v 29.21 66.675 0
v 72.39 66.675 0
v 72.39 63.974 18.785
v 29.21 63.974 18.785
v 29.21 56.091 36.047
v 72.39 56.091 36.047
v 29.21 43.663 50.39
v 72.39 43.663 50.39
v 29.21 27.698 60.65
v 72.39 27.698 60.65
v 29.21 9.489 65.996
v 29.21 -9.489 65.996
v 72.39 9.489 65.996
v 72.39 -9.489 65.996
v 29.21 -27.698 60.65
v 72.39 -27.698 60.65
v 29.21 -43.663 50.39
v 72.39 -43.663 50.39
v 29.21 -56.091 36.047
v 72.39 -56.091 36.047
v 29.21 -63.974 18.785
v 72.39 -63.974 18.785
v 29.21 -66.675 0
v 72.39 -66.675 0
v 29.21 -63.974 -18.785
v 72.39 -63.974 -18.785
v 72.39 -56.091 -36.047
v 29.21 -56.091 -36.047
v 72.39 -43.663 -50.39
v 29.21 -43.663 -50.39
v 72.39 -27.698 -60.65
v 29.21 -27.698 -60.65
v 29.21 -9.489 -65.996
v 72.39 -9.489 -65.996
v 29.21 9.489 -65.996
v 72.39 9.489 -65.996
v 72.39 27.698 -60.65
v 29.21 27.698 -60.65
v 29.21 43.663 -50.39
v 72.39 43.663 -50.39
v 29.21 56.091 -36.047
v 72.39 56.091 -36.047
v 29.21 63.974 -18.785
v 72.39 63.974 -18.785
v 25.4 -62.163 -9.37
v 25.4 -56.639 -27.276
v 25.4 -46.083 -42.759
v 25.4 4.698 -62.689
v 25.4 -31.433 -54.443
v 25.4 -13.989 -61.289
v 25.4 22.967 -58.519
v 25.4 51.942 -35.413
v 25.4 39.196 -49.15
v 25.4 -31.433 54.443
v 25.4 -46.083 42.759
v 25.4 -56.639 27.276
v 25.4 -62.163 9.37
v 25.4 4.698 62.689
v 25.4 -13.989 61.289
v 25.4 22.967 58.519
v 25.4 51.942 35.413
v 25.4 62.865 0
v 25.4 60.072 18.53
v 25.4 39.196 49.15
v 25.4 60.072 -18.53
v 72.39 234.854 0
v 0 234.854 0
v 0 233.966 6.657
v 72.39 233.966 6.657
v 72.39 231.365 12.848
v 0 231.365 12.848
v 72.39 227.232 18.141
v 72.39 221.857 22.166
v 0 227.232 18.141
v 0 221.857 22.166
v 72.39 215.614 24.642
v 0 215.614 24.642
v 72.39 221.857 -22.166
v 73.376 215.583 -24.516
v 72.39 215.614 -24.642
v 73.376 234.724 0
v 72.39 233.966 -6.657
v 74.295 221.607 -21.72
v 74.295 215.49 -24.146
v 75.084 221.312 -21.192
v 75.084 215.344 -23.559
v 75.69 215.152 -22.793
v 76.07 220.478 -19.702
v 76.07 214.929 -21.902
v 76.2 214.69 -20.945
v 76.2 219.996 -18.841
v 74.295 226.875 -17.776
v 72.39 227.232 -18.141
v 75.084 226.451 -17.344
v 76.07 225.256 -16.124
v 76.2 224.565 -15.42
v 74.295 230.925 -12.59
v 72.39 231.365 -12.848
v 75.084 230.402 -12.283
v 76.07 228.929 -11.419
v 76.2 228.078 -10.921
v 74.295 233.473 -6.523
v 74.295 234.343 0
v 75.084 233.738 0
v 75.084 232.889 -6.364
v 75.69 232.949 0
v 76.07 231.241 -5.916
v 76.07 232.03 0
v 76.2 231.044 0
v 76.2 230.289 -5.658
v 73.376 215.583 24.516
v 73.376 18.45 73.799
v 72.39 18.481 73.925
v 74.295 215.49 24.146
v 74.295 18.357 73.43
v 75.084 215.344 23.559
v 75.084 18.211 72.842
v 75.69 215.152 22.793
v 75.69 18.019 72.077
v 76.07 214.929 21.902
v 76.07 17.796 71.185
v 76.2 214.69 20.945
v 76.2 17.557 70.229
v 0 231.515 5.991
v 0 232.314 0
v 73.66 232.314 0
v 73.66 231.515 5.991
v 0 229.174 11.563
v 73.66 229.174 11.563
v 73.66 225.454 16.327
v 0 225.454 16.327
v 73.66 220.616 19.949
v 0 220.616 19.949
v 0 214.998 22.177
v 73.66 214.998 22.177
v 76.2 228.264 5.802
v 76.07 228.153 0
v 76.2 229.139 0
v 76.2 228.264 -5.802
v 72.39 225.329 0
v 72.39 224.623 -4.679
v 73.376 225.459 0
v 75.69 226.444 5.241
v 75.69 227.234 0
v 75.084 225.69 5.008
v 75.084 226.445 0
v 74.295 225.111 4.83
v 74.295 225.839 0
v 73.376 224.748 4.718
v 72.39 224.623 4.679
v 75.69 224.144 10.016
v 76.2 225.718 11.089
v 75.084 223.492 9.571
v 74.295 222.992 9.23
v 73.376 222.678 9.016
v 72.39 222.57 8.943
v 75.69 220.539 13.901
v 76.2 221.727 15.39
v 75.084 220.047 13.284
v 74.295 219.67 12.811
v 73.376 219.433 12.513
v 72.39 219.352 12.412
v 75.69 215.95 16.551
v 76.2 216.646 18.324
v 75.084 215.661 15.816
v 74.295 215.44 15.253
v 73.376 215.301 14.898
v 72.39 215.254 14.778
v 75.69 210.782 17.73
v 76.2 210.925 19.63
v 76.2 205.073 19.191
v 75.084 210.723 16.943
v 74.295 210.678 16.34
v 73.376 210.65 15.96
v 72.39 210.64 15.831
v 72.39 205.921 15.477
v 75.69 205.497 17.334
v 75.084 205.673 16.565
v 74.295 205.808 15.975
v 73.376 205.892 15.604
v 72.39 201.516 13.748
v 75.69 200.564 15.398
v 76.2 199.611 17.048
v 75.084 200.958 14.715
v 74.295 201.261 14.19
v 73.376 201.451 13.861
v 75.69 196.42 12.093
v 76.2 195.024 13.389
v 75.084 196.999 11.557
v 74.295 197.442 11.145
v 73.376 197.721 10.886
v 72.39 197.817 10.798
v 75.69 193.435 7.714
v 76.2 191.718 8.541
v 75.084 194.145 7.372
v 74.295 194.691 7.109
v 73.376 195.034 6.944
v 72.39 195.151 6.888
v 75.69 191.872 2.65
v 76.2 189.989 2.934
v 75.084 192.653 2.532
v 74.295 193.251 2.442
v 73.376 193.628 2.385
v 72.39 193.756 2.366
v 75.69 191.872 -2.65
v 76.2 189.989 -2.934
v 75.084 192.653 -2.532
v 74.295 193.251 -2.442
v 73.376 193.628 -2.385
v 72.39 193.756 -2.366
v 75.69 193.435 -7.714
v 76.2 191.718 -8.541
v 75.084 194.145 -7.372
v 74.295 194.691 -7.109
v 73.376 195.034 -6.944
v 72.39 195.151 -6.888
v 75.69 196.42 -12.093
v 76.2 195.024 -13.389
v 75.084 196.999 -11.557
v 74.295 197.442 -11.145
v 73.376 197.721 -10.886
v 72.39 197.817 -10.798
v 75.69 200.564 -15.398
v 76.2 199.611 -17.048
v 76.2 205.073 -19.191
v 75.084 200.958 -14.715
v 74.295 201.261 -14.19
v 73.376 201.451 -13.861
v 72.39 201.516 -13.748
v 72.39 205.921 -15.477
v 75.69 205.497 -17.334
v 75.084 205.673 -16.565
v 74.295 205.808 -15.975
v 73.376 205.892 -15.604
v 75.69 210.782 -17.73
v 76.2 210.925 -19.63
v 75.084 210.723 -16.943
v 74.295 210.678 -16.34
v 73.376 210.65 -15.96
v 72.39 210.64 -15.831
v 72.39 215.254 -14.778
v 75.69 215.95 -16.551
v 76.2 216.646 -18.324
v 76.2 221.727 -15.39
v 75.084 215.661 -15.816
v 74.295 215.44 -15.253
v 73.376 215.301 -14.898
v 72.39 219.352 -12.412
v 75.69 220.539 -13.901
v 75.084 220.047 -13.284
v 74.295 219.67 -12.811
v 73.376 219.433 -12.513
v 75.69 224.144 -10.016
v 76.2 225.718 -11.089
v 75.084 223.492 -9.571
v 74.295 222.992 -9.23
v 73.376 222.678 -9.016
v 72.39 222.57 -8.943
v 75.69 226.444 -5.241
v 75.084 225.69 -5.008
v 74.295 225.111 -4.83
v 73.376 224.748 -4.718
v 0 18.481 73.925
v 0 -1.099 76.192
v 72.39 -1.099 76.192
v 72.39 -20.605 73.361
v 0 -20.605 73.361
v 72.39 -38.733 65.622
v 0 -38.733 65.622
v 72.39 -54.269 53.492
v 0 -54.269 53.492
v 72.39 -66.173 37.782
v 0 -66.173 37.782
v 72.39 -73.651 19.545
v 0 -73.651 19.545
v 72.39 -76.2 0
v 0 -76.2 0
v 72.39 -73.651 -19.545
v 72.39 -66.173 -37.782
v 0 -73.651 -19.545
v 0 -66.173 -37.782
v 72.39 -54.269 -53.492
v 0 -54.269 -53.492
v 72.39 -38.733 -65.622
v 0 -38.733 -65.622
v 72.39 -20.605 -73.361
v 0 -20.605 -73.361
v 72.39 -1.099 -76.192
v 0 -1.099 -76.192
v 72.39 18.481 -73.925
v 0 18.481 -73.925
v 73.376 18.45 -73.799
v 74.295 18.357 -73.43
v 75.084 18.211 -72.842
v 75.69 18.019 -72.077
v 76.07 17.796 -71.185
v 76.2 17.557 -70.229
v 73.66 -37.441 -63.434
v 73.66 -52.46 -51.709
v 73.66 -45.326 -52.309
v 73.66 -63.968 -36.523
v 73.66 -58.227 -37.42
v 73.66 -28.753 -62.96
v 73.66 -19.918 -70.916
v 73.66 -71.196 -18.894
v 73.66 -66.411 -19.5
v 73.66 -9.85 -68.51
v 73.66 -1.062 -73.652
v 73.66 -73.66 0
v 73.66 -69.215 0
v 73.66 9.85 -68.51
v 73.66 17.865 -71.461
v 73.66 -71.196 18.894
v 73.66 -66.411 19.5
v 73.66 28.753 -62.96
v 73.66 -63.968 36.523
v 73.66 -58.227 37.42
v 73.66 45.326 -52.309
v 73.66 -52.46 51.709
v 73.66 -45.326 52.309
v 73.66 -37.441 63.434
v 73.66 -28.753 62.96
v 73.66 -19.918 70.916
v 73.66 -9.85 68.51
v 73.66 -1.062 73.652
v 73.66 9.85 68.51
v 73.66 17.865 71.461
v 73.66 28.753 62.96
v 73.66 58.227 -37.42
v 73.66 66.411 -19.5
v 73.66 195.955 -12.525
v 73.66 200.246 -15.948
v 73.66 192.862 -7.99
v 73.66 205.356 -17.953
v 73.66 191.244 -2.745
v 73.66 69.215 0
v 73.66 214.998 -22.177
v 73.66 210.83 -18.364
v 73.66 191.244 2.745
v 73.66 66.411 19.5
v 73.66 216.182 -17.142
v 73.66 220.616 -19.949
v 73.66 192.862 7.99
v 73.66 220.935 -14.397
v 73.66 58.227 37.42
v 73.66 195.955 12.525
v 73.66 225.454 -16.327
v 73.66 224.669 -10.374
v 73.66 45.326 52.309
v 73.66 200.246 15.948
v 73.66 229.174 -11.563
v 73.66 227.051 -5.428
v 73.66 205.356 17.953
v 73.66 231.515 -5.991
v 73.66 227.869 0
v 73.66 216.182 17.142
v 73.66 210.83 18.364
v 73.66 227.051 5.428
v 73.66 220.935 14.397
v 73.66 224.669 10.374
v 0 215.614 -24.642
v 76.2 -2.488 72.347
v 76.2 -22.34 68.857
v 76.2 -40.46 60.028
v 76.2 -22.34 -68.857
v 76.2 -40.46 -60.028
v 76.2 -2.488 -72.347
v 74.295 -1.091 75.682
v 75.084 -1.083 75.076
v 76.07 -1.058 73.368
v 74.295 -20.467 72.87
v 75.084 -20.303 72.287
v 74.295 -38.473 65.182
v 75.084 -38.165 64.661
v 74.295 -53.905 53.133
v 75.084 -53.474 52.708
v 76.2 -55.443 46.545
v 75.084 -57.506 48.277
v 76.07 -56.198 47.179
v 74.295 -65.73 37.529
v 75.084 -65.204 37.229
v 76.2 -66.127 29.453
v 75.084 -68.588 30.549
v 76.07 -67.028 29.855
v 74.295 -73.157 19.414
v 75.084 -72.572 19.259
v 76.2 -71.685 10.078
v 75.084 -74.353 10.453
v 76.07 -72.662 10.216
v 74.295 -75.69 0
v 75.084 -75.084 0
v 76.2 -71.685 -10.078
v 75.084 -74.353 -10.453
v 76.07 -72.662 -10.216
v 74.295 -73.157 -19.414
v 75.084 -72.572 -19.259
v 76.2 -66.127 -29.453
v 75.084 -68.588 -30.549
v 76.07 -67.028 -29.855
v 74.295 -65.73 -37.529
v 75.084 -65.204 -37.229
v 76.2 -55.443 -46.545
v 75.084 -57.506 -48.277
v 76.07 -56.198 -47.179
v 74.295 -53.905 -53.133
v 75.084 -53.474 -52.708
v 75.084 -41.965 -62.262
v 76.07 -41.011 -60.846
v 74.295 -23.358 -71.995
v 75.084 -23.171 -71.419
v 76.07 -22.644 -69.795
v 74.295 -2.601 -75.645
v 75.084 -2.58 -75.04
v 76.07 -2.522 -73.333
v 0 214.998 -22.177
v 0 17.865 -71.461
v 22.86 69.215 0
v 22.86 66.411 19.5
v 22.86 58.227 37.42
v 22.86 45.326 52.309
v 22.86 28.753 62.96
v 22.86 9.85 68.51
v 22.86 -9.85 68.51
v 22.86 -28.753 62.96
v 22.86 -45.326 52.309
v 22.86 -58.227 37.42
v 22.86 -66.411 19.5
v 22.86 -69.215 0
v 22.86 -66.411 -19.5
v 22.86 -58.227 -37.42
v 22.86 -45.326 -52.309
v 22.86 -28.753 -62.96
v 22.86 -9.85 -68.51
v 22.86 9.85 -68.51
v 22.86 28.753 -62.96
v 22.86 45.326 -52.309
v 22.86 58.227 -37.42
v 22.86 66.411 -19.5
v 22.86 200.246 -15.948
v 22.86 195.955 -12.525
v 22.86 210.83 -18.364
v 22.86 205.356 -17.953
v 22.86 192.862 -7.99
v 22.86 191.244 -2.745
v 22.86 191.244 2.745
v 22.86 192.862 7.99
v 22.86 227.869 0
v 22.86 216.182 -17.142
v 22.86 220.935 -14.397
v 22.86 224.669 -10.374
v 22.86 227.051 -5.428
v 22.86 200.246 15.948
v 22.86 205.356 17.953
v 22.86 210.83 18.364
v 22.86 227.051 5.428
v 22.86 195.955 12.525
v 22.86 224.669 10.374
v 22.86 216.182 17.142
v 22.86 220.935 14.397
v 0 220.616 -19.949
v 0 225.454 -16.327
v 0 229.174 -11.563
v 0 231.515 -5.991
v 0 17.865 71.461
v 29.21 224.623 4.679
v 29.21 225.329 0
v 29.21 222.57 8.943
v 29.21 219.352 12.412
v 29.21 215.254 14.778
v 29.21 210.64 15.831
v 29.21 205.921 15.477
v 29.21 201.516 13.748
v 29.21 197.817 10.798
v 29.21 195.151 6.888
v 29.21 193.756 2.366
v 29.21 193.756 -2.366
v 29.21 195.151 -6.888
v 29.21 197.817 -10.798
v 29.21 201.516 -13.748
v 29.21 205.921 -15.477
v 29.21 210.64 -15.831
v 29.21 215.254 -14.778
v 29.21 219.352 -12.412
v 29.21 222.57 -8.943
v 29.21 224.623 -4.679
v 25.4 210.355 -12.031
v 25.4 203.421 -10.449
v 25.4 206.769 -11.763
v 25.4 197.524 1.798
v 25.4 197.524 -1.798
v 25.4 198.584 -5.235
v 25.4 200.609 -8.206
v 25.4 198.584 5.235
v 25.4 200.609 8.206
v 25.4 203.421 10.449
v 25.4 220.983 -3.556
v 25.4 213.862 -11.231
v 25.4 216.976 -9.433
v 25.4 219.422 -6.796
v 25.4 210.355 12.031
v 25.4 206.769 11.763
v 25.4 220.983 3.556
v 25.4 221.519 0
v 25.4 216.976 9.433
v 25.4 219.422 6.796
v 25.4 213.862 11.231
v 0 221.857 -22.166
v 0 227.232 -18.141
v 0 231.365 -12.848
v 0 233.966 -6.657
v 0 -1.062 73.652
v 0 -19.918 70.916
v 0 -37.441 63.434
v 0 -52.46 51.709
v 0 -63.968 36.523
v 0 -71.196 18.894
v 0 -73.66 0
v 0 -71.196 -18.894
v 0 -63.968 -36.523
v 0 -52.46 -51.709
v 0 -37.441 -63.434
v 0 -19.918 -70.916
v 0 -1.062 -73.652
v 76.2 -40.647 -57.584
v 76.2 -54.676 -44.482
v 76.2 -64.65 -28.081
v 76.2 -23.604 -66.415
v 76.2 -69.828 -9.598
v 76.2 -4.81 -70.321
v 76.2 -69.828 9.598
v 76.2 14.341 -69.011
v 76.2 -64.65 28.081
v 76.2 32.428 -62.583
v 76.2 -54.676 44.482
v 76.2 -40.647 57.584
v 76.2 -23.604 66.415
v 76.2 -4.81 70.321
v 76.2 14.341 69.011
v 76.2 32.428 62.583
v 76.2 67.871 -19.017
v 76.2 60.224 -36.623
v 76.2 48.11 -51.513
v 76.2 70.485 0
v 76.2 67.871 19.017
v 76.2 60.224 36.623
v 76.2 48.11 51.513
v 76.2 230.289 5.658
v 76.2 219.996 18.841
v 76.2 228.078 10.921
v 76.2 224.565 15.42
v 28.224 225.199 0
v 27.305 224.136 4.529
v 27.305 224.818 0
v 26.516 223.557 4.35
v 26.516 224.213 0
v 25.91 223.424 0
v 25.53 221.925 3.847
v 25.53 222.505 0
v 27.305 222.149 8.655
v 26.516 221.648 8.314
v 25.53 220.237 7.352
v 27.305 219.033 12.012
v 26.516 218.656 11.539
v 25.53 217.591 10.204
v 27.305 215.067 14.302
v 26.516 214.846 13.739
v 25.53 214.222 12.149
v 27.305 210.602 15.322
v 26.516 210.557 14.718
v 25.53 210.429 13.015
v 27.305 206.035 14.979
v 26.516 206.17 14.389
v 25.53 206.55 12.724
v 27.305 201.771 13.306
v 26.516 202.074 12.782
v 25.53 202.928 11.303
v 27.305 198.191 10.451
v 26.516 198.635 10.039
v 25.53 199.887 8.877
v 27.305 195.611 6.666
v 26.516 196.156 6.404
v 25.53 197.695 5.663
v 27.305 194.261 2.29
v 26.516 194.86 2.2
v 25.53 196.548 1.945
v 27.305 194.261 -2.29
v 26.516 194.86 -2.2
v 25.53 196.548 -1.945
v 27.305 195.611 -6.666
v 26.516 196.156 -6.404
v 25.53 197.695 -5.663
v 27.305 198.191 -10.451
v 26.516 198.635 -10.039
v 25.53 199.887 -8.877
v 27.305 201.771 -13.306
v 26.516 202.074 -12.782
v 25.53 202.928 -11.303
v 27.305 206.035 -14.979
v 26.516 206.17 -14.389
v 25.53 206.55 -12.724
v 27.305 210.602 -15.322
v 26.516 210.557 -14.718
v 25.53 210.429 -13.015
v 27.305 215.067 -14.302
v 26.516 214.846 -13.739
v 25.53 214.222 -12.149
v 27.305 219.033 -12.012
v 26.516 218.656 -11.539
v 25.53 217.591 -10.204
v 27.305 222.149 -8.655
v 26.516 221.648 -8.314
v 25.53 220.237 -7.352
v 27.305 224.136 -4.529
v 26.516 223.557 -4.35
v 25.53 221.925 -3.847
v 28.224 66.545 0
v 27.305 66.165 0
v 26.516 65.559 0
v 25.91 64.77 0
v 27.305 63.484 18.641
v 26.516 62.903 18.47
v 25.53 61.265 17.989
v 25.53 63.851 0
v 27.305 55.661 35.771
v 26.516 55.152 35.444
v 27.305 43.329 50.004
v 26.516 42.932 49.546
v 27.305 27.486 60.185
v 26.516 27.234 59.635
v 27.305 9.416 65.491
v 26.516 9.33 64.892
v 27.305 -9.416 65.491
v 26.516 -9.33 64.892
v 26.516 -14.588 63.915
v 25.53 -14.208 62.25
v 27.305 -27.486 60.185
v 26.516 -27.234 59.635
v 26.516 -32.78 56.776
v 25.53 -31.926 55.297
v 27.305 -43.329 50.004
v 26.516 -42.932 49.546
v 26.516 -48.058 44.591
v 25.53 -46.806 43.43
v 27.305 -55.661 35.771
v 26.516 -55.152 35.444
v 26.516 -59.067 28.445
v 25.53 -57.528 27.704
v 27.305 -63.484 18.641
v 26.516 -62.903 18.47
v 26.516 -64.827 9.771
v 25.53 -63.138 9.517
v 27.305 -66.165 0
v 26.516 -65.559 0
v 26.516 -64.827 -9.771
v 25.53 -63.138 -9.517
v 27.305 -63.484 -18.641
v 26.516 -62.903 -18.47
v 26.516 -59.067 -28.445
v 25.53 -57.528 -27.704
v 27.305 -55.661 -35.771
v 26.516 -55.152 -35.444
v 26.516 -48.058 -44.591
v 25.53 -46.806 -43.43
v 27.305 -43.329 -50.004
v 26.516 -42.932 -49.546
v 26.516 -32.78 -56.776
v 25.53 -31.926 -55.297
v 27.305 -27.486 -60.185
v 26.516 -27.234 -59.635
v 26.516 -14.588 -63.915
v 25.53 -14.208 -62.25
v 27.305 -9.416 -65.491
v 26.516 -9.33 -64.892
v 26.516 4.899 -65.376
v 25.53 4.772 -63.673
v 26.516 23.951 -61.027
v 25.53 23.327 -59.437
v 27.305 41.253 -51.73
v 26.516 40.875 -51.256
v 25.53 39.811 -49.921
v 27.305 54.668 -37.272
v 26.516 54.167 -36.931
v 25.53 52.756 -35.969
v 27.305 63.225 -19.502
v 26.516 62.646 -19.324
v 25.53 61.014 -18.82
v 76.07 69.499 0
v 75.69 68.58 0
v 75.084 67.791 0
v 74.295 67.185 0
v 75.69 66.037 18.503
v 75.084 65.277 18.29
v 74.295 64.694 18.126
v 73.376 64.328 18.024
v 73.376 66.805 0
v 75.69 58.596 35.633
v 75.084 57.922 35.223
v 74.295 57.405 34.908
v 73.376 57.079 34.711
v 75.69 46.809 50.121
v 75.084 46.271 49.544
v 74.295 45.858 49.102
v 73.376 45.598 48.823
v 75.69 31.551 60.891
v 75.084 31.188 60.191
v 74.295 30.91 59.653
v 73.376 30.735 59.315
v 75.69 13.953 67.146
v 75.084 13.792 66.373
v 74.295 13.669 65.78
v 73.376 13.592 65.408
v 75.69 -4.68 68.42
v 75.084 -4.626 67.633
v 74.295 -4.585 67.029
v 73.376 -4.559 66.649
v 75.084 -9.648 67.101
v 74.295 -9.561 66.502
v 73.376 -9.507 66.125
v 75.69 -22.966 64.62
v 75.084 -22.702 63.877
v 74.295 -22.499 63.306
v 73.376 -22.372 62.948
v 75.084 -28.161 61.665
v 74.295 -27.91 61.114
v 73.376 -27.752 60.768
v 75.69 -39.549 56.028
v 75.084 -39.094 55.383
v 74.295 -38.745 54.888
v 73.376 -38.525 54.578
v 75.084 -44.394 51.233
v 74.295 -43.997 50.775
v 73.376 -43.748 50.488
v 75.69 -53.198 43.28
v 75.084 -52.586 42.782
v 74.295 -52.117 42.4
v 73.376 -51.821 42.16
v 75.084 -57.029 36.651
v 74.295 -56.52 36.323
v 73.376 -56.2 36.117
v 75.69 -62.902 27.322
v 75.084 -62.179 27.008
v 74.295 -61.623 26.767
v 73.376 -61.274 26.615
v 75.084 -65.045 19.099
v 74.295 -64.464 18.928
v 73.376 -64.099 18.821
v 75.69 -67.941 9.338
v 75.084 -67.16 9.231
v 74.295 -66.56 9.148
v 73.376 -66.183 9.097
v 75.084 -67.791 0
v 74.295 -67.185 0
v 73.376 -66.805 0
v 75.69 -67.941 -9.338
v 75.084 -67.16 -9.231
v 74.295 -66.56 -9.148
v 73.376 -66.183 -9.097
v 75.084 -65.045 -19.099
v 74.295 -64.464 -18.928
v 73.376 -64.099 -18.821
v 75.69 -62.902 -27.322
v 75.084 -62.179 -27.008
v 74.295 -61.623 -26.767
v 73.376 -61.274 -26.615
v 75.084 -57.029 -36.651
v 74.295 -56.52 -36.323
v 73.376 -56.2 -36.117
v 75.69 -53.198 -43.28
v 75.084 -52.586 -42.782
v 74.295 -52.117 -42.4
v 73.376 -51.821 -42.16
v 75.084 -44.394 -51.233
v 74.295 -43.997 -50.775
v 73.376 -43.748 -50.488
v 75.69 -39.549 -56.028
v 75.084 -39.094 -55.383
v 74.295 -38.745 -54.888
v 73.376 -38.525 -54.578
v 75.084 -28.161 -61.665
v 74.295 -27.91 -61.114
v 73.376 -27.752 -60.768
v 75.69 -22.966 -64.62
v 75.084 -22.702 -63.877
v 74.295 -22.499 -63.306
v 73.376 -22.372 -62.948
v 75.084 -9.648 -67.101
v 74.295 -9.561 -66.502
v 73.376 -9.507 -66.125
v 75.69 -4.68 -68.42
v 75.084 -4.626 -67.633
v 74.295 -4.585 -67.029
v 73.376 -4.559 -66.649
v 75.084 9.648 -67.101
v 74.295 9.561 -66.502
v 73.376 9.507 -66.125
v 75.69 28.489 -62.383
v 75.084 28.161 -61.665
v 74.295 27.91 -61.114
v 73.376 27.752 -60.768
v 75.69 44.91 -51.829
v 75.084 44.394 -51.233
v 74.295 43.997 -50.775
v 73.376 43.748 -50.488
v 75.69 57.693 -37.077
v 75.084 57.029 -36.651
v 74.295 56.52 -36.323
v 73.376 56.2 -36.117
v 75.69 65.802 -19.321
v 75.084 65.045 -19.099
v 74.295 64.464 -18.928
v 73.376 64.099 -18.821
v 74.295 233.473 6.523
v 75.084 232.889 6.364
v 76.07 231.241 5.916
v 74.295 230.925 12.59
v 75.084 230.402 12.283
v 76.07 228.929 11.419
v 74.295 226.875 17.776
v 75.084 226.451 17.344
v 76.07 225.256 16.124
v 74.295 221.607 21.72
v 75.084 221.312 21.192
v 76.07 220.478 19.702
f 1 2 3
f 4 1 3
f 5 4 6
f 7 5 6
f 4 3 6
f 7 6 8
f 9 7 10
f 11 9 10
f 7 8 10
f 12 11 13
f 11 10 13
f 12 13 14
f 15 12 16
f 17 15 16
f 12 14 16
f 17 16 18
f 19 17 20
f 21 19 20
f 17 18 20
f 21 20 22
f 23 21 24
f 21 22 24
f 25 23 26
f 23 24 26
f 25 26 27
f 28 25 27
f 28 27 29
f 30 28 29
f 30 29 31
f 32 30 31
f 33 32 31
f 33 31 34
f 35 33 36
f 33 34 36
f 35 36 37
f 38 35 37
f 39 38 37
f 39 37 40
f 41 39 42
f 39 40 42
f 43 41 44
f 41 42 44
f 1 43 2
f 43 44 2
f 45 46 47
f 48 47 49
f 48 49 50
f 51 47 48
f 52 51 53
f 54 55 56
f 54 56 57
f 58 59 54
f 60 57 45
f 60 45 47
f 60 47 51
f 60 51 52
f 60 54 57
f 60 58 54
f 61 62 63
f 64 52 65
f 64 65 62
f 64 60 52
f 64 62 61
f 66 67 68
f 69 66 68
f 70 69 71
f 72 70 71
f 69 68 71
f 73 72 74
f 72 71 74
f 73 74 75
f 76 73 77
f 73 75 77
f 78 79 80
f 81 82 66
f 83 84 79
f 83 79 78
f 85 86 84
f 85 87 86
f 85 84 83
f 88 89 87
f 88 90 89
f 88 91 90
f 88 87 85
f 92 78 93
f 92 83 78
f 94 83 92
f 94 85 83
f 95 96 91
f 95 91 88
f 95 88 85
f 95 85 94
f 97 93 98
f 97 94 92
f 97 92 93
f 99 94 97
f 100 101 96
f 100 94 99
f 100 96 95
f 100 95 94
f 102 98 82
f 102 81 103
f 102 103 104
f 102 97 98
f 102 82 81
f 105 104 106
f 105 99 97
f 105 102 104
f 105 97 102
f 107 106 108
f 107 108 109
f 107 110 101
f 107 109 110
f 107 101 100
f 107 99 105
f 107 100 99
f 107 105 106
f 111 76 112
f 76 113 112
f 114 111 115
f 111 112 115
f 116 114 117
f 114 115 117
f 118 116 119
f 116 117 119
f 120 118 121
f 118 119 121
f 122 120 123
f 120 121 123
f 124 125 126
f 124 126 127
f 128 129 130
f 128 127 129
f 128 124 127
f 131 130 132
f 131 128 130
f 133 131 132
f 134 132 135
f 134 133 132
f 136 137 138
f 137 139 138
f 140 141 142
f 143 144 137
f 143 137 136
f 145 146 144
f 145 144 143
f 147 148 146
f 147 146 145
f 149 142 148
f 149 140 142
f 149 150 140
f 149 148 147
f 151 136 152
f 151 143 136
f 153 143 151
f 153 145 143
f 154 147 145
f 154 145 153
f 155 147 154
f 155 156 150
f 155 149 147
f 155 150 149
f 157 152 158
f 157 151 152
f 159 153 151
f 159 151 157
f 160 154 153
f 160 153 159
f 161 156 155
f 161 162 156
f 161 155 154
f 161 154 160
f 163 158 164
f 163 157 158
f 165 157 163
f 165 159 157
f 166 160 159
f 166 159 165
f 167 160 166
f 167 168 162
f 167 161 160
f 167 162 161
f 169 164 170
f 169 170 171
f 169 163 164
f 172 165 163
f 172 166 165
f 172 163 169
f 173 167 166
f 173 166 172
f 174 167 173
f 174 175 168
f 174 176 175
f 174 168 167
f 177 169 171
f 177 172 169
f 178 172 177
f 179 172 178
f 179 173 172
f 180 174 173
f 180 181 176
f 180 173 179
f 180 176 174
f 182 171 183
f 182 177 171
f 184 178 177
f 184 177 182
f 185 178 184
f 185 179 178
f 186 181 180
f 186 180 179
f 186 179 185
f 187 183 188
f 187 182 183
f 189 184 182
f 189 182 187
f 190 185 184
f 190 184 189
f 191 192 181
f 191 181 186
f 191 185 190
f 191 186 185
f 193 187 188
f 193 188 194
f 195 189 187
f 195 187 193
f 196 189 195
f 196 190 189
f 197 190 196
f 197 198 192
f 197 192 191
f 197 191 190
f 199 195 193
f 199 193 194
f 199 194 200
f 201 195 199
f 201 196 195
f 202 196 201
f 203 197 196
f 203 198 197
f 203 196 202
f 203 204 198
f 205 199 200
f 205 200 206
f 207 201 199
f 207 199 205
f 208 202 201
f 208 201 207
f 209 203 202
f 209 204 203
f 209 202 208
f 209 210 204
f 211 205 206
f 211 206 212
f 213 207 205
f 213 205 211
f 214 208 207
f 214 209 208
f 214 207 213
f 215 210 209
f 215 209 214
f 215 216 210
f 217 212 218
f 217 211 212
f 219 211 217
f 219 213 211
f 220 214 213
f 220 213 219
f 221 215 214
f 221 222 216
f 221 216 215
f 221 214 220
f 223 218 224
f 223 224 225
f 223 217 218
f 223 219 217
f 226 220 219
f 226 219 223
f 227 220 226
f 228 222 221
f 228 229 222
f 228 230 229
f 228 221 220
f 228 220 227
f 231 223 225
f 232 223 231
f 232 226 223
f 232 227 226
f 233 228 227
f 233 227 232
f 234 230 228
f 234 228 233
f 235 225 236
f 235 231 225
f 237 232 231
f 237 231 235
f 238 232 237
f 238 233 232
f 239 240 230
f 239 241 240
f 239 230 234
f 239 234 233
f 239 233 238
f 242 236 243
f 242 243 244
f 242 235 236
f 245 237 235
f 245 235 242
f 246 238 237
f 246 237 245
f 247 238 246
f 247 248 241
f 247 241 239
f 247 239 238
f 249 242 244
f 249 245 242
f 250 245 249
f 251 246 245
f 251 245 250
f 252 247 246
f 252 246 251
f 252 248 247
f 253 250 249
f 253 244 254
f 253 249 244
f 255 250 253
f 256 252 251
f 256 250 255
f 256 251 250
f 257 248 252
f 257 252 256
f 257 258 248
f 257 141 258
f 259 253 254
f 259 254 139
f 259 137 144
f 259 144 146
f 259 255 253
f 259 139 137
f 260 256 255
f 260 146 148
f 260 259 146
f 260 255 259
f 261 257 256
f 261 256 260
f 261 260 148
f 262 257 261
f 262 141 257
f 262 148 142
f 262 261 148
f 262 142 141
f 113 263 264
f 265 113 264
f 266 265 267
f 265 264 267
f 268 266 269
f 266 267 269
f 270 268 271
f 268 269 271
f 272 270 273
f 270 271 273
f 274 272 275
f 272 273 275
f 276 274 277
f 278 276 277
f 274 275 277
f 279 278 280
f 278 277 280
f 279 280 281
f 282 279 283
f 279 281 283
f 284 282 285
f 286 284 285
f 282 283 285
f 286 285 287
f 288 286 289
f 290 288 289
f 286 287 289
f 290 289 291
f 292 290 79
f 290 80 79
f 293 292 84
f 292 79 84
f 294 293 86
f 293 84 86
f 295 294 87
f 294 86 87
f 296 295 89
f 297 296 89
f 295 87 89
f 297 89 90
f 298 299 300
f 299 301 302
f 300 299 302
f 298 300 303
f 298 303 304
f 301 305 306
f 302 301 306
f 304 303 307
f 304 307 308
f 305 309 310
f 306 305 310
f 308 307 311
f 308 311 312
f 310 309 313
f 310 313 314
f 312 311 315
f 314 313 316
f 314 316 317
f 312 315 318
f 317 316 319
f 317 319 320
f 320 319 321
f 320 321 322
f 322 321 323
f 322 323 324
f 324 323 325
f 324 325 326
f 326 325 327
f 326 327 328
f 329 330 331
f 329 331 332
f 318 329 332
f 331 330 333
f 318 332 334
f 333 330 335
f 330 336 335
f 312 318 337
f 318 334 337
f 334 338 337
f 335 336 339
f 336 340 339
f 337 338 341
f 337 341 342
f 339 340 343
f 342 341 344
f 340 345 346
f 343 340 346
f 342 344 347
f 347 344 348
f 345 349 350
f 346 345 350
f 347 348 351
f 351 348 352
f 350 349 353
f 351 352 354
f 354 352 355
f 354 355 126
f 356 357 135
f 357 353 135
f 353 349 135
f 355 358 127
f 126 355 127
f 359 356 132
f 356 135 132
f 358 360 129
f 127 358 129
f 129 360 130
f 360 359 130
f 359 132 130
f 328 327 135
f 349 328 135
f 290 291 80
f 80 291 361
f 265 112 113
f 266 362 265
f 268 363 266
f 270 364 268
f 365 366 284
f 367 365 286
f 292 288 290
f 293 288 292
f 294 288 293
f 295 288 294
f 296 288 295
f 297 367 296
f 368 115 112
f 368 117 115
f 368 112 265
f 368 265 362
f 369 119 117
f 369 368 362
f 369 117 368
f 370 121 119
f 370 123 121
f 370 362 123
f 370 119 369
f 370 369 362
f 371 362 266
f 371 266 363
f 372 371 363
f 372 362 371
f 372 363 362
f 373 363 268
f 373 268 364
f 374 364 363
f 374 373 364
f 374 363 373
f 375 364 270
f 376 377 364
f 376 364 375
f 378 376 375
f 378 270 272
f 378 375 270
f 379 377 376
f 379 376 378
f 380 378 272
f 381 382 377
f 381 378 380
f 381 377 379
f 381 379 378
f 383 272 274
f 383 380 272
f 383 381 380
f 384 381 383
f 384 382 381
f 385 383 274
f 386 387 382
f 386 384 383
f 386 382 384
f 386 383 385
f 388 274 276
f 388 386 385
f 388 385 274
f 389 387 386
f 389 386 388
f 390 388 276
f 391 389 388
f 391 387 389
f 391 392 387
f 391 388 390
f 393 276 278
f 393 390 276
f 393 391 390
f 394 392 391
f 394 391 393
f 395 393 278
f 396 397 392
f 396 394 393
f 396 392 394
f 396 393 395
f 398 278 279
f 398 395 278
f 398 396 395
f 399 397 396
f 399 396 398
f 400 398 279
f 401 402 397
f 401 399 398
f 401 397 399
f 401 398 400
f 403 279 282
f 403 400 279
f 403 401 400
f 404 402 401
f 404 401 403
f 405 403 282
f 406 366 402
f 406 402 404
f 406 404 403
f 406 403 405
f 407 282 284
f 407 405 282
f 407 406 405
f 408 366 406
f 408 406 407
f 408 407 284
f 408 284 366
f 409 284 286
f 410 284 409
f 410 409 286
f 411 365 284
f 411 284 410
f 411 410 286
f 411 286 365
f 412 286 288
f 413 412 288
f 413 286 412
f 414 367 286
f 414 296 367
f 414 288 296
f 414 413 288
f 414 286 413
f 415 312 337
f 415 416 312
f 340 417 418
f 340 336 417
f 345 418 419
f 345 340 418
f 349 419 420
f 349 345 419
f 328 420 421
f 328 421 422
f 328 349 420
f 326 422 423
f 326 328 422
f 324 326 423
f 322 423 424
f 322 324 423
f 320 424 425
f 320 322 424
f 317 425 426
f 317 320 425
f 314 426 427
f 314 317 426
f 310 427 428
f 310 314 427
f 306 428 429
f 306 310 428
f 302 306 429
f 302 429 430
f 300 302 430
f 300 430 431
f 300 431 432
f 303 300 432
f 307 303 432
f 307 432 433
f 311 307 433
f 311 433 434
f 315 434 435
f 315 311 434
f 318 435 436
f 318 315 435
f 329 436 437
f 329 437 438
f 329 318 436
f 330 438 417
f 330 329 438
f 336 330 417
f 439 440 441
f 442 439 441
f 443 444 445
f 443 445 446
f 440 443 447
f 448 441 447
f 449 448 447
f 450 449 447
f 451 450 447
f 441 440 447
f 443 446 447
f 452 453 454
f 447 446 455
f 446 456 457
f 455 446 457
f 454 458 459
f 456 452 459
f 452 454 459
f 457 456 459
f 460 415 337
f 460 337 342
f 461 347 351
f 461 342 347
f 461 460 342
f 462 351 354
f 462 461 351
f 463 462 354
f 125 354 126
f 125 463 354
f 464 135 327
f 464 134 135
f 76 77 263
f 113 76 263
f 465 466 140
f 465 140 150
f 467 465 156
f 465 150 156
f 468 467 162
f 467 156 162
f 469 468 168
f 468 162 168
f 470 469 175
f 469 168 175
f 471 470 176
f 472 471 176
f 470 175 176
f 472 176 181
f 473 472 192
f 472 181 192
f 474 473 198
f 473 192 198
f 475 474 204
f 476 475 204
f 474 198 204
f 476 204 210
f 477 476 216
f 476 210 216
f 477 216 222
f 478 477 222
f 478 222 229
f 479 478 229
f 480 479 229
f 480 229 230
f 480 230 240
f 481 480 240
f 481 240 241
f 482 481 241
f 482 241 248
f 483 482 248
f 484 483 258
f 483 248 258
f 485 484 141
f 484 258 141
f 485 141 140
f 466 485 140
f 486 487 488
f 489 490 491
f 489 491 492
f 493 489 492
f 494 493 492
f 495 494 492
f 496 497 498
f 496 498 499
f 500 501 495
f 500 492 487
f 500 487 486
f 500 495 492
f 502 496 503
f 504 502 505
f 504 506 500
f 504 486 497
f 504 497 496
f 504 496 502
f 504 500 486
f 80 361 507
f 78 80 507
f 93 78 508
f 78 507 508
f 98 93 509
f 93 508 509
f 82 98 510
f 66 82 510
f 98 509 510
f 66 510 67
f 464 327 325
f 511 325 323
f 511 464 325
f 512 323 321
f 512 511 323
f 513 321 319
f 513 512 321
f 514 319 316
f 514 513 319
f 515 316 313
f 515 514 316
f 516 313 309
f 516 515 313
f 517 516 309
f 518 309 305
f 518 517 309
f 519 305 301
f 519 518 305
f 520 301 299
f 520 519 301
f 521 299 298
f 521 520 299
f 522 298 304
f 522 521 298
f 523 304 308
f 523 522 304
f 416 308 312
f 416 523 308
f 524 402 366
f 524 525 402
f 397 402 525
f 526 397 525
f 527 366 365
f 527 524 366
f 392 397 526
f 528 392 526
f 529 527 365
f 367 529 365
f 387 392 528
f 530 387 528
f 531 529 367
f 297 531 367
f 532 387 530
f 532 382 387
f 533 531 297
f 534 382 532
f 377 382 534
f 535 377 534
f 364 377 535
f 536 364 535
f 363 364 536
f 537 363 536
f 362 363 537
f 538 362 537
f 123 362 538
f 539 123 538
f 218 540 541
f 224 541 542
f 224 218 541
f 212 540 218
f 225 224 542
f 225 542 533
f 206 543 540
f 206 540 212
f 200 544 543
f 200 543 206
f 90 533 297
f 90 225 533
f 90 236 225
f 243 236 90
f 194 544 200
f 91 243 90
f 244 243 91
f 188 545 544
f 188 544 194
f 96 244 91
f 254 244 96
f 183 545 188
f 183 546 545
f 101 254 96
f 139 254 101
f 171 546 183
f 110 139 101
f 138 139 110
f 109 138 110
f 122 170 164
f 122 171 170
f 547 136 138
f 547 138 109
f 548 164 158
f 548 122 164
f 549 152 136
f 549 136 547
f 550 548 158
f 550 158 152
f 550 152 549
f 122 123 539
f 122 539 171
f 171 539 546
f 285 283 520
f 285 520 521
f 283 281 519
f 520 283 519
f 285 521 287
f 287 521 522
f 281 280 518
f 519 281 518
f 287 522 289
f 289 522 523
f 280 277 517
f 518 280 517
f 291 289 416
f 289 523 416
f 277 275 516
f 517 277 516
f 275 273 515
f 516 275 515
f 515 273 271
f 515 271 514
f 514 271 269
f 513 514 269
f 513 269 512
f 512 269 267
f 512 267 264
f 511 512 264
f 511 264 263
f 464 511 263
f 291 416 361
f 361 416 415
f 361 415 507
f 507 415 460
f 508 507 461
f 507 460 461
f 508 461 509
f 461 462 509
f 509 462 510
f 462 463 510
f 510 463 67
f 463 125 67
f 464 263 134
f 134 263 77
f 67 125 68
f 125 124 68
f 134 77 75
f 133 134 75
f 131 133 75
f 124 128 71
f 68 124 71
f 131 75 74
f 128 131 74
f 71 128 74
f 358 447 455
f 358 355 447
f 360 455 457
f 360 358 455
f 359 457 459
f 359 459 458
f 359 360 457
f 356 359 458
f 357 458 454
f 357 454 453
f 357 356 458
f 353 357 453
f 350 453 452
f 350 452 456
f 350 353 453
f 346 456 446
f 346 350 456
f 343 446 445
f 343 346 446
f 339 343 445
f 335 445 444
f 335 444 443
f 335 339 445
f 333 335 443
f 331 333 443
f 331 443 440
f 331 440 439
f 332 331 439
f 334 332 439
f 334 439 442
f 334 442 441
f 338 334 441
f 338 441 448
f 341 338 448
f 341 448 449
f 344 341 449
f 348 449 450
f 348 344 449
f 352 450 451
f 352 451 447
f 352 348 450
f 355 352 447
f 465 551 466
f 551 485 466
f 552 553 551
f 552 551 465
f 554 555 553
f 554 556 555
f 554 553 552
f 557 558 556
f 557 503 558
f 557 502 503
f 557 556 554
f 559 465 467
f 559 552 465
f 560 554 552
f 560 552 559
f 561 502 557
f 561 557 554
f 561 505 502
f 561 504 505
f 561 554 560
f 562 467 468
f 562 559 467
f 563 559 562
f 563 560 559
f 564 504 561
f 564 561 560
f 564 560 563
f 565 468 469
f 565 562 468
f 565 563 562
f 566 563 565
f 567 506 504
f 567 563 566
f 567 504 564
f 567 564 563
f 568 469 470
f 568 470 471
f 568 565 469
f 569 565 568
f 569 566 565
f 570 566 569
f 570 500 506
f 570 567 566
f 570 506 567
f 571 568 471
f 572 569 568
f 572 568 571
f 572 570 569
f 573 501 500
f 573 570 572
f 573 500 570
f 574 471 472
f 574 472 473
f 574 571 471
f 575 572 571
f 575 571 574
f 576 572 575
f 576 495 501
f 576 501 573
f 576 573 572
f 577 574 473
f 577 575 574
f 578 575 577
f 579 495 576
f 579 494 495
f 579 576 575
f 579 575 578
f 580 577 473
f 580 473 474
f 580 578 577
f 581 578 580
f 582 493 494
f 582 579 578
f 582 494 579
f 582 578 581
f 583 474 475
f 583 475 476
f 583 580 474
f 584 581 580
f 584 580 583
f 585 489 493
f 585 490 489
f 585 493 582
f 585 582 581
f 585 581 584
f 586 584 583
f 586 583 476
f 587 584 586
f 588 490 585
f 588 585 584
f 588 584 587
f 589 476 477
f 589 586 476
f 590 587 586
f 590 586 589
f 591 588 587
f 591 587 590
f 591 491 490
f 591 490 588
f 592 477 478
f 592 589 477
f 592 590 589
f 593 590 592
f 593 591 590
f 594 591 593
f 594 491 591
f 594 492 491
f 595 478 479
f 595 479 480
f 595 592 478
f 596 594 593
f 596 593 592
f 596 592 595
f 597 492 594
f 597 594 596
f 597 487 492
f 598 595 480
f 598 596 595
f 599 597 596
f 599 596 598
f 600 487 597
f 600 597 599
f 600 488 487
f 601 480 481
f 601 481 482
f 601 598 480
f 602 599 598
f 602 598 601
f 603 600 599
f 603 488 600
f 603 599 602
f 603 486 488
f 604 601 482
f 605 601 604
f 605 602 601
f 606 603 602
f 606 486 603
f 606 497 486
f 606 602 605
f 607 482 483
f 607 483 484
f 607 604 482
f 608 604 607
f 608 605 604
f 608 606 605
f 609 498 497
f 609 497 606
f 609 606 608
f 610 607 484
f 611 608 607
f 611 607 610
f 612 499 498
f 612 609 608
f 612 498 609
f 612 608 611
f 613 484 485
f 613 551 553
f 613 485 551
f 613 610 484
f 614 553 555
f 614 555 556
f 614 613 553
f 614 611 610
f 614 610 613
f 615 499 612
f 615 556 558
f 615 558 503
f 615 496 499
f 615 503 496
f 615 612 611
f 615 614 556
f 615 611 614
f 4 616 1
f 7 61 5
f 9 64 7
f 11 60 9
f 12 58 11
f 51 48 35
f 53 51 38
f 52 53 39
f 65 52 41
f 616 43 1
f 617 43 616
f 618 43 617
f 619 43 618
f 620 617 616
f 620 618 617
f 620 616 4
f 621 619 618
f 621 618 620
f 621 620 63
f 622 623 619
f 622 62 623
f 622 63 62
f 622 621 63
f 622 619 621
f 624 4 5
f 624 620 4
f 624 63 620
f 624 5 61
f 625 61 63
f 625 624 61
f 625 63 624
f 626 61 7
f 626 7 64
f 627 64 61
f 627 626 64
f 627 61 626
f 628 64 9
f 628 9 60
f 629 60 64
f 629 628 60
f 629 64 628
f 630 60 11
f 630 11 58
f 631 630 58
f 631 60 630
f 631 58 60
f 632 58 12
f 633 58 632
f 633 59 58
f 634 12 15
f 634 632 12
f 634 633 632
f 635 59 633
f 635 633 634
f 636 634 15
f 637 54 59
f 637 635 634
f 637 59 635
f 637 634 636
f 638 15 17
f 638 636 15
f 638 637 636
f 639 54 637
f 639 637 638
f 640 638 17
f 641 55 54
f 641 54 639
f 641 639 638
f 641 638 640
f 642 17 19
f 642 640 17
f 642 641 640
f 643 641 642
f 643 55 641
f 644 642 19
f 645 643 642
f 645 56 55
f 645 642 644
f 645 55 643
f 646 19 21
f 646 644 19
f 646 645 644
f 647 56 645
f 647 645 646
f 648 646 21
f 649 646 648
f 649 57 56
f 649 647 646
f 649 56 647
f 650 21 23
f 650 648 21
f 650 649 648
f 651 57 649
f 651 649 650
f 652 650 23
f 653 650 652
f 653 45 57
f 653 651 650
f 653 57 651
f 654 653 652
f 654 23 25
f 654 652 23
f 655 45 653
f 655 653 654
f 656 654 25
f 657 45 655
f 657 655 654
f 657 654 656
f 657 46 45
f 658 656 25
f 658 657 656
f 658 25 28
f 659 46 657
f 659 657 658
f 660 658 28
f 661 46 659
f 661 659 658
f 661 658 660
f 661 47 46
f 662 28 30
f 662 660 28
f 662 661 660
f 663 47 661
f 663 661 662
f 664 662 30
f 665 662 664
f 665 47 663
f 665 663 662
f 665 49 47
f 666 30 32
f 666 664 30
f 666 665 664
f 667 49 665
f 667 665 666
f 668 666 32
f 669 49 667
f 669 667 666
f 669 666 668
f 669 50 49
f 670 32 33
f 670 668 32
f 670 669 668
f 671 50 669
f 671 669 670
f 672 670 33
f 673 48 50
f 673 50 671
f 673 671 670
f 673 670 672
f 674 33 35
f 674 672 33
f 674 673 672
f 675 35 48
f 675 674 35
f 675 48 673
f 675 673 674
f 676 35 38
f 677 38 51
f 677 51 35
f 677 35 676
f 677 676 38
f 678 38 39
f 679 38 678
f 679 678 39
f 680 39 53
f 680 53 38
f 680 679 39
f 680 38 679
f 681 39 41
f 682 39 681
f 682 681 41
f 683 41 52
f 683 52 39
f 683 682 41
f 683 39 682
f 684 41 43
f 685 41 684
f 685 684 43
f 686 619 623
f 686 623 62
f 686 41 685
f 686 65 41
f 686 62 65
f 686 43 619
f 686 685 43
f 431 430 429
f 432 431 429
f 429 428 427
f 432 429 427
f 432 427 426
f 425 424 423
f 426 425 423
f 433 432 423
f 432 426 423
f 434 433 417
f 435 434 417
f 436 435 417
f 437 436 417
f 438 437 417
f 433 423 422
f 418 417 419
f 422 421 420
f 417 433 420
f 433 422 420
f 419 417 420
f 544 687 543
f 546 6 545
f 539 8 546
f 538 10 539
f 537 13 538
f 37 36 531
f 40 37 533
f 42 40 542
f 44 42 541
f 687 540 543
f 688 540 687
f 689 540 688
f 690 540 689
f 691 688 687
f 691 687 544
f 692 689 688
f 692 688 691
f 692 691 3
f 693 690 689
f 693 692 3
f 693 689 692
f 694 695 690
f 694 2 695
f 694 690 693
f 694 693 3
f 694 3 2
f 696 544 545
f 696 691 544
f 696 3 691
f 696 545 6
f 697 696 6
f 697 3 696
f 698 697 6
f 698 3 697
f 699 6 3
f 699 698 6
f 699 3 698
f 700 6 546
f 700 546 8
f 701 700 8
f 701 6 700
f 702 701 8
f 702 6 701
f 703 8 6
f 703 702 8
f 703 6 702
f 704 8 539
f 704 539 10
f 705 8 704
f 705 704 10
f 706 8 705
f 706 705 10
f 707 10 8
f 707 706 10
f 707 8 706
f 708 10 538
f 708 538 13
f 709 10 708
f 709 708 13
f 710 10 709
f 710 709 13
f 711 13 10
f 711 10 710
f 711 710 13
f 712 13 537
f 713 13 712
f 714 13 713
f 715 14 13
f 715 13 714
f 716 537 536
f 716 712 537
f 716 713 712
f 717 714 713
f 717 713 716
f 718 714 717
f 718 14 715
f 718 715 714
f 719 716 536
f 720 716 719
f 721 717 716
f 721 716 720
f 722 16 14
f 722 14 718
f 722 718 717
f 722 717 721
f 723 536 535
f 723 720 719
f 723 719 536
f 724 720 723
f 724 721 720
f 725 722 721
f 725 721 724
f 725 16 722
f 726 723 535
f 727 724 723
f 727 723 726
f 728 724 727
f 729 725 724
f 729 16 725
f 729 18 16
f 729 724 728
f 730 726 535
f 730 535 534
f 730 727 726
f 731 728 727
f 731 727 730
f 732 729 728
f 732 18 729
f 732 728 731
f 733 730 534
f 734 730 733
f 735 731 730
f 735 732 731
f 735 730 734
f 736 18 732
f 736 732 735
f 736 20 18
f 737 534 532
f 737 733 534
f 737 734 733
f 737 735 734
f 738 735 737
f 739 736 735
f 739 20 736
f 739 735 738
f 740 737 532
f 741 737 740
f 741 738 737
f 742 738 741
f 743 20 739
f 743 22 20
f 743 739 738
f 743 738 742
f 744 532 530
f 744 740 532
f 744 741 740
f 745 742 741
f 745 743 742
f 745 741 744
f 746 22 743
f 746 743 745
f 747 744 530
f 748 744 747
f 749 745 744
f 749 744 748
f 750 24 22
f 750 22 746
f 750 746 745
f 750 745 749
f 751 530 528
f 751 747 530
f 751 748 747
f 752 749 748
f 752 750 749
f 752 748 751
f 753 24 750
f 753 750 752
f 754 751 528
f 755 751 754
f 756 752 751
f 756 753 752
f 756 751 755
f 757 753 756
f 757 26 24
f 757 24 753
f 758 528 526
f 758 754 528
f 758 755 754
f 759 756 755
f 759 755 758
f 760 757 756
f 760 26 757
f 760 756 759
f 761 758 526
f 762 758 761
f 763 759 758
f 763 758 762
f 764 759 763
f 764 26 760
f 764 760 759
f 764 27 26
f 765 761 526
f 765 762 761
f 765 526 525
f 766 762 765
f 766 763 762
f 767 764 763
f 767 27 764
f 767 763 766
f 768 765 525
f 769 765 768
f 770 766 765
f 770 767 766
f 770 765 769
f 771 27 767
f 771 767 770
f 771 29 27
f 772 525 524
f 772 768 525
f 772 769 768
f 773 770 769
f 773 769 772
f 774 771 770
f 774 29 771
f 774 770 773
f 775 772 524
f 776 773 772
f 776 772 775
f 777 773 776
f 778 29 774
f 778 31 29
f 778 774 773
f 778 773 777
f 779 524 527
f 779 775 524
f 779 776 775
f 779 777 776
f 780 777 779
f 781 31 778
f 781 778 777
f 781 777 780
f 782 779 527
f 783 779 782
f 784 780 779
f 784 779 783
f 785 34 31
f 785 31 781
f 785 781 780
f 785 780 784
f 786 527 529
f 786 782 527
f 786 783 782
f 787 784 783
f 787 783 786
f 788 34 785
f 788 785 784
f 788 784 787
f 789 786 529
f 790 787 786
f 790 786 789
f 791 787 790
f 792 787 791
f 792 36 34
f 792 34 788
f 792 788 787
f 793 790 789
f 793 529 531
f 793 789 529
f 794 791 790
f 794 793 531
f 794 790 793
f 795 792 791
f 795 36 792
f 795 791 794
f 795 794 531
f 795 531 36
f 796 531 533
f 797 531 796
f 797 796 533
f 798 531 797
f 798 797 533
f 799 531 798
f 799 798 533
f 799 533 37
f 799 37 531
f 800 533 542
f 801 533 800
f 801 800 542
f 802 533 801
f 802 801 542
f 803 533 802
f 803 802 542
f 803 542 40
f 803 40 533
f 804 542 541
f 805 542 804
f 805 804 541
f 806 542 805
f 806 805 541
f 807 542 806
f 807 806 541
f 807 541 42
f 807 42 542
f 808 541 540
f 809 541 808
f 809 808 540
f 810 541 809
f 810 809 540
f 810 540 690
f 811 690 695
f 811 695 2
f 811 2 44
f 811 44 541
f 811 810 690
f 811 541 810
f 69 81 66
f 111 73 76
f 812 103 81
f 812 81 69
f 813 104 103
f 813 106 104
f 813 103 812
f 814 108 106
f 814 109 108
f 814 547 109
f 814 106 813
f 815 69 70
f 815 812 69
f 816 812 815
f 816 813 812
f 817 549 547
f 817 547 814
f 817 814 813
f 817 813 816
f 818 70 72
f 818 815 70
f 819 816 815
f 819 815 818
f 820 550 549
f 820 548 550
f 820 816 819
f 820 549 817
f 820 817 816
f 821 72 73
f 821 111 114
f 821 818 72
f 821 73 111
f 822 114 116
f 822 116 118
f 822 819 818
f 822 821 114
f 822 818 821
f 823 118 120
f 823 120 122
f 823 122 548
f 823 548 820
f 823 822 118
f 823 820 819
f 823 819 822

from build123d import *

# Parameters (mm, degrees)
F1_DEPTH = 76.2
F2_R     = 66.675
F2_R_2   = 15.875
F3_DEPTH = 50.8
F4_T     = -2.54
F5_R     = 3.81
F6_R     = 3.81


with BuildPart() as f1:
    # F0 (on Right) → F1 (new body)
    with BuildSketch(Plane.YZ):
        with BuildLine():
            ThreePointArc((18.4812146278, -73.9248585111), (60.0612543768, -46.8944103565), (76.2, 0))
            ThreePointArc((76.2, 0), (60.0612543768, 46.8944103565), (18.4812146278, 73.9248585111))
            ThreePointArc((18.4812146278, 73.9248585111), (-76.2, 0), (18.4812146278, -73.9248585111))
        make_face()
        with BuildLine():
            ThreePointArc((18.4812146278, 73.9248585111), (60.0612543768, 46.8944103565), (76.2, 0))
            ThreePointArc((76.2, 0), (60.0612543768, -46.8944103565), (18.4812146278, -73.9248585111))
            Line((18.4812146278, -73.9248585111), (215.6141706573, -24.6416195037))
            ThreePointArc((215.6141706573, -24.6416195037), (184.2029995957, -2.7493284703), (210.1666790363, 25.3899931999))
            ThreePointArc((210.1666790363, 25.3899931999), (212.910735745, 25.1636515369), (215.6141706573, 24.6416195037))
            Line((215.6141706573, 24.6416195037), (18.4812146278, 73.9248585111))
        make_face()
        with BuildLine():
            Line((210.1666790363, 25.3899931999), (215.6141706573, 24.6416195037))
            ThreePointArc((215.6141706573, 24.6416195037), (212.910735745, 25.1636515369), (210.1666790363, 25.3899931999))
        make_face()
        with BuildLine():
            ThreePointArc((234.8537657814, 0), (229.474183907, 15.6314701188), (215.6141706573, 24.6416195037))
            Line((215.6141706573, 24.6416195037), (210.1666790363, 25.3899931999))
            ThreePointArc((210.1666790363, 25.3899931999), (184.2029995957, -2.7493284703), (215.6141706573, -24.6416195037))
            ThreePointArc((215.6141706573, -24.6416195037), (229.474183907, -15.6314701188), (234.8537657814, 0))
        make_face()
    extrude(amount=F1_DEPTH)

    # F2 (on face) → F3 (cut)
    with BuildSketch(Plane.YZ.offset(76.2)):
        Circle(F2_R)
        with Locations((209.4537657814, 0)):
            Circle(F2_R_2)
    extrude(amount=-F3_DEPTH, mode=Mode.SUBTRACT)

    # F4
    f4_openings = [f1.faces().sort_by_distance(p)[0] for p in [
        (0, 57.51924, 0),
    ]]
    offset(amount=F4_T, openings=f4_openings, kind=Kind.INTERSECTION)

    # F5
    f5_edges = [f1.edges().sort_by_distance(p)[0] for p in [
        (76.2, -76.2, 0),
        (76.2, 117.047693, 49.283239),
        (76.2, 117.047693, -49.283239),
        (76.2, 234.853766, 0),
        (76.2, -66.675, 0),
        (76.2, 193.578766, 0),
    ]]
    fillet(f5_edges, radius=F5_R)

    # F6
    f6_edges = [f1.edges().sort_by_distance(p)[0] for p in [
        (25.4, -66.675, 0),
        (25.4, 193.578766, 0),
    ]]
    fillet(f6_edges, radius=F6_R)


solid = f1.part
